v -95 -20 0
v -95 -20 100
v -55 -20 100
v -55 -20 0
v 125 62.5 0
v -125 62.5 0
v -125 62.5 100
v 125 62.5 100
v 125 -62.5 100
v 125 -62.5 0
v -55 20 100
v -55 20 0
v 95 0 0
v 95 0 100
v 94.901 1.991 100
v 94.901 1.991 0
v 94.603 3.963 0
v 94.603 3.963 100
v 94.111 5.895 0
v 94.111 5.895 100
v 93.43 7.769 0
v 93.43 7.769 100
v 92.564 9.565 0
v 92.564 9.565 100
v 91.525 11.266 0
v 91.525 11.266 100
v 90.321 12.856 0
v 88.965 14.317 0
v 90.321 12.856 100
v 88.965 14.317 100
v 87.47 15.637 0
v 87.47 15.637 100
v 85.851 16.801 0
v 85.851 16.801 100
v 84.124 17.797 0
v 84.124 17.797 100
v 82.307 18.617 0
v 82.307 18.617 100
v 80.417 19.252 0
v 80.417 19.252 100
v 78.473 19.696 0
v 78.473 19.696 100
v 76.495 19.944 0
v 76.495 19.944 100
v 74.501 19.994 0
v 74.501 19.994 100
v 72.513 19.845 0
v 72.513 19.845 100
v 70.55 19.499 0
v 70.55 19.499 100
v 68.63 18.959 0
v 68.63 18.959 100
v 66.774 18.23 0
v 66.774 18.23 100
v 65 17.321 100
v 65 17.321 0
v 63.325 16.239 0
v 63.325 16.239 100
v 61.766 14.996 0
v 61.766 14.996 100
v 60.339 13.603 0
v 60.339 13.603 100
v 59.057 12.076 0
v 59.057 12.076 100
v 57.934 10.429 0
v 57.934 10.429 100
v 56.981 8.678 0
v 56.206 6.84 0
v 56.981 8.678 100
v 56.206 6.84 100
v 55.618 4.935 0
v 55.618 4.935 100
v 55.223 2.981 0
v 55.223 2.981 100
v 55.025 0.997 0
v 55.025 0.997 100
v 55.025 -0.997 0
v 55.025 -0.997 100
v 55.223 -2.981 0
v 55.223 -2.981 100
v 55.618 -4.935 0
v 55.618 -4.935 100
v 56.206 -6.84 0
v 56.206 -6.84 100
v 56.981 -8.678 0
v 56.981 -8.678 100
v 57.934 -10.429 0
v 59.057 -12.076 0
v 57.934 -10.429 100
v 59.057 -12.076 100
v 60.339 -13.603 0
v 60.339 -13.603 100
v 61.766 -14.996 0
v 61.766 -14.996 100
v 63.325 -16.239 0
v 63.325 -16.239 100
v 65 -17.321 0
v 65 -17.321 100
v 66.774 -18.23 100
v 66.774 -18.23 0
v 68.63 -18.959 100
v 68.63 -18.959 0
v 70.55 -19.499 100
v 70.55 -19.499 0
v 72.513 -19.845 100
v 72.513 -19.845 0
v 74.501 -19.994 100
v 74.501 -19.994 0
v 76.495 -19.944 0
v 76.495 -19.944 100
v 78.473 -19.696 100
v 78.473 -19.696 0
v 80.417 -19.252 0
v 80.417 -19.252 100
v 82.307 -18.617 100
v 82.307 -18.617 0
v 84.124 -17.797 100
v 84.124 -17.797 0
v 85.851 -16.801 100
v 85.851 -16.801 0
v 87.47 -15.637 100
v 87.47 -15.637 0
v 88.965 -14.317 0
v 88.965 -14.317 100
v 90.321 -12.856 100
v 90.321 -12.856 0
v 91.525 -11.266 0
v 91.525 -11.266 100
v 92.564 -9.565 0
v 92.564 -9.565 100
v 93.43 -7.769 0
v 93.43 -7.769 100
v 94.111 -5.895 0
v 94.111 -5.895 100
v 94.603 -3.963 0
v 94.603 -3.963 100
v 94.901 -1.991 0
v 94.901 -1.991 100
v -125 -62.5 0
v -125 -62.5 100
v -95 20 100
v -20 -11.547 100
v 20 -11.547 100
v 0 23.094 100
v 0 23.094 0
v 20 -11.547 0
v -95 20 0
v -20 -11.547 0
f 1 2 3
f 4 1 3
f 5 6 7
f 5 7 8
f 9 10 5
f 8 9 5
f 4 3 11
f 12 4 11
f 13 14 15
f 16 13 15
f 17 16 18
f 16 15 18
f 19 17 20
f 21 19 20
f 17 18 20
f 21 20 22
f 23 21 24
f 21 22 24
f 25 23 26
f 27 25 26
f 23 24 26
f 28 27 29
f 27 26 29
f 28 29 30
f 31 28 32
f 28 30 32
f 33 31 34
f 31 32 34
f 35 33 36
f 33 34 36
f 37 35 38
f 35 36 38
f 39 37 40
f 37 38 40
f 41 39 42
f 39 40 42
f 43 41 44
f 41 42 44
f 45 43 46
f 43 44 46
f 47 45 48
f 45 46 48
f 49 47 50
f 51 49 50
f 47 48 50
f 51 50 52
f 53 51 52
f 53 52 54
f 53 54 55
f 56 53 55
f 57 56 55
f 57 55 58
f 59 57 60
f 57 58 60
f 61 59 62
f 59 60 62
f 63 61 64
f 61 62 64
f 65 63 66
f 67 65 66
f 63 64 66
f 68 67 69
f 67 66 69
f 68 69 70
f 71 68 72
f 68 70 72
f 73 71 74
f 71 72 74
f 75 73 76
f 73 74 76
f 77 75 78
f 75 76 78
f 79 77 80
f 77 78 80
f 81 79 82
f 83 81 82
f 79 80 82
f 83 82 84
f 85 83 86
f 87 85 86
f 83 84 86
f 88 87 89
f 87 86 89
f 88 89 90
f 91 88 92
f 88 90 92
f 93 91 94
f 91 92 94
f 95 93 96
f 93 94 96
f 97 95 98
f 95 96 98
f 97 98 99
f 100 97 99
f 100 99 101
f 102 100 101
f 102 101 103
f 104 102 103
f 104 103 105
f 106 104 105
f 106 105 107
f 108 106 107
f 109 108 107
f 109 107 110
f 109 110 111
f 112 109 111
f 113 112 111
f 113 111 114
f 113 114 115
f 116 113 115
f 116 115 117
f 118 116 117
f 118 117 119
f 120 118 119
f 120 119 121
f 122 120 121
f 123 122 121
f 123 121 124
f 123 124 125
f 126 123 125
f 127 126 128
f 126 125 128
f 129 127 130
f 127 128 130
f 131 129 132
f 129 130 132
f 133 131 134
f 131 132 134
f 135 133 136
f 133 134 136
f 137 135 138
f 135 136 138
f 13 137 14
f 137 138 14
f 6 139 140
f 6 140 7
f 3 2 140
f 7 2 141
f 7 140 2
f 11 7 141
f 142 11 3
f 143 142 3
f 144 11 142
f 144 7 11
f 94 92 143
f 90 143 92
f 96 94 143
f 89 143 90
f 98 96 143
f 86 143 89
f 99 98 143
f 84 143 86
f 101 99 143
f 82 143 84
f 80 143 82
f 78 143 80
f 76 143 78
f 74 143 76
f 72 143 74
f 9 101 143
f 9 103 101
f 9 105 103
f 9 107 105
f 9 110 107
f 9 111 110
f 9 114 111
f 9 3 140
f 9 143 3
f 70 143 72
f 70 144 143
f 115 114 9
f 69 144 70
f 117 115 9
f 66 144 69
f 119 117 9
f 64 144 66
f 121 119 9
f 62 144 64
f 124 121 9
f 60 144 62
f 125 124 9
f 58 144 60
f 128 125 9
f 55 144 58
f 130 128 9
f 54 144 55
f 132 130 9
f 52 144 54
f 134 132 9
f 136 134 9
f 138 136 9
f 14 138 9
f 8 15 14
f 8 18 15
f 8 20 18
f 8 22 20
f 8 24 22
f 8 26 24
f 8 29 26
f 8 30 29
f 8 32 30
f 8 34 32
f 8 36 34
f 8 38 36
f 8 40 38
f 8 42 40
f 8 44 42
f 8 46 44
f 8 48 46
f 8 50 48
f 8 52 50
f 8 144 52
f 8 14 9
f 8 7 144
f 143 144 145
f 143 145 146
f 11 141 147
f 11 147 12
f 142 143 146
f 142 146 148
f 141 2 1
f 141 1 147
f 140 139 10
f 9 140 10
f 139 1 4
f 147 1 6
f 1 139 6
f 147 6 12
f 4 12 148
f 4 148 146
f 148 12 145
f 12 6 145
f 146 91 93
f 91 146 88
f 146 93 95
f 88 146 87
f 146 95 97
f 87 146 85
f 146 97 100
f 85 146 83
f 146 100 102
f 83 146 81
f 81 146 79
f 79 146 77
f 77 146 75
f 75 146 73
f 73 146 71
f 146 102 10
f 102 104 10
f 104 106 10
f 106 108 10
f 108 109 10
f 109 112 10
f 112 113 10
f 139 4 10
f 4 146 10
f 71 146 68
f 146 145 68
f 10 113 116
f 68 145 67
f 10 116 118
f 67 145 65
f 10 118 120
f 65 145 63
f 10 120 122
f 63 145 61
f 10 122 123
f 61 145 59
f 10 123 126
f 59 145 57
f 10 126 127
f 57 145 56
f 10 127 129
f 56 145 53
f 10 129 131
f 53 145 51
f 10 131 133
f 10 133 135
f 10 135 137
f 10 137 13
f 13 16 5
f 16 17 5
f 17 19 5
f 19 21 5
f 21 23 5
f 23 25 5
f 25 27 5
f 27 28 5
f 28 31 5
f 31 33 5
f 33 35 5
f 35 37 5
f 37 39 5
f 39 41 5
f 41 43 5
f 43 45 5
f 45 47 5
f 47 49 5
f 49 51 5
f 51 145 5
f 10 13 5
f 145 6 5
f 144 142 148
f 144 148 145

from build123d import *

# Parameters (mm, degrees)
SKETCH1_W           = 250
SKETCH1_H           = 125
SKETCH1_W_2         = 230
SKETCH1_H_2         = 115
BOSS_EXTRUDE1_DEPTH = 100
SKETCH3_W           = 250
SKETCH3_H           = 125
SKETCH3_W_2         = 230
SKETCH3_H_2         = 115
SKETCH3_R           = 20
SKETCH3_W_3         = 40
SKETCH3_H_3         = 40
BOSS_EXTRUDE4_DEPTH = 100


with BuildPart() as part:
    # Sketch1 → Boss-Extrude1 (new body)
    with BuildSketch(Plane.XY):
        Rectangle(SKETCH1_W, SKETCH1_H)
        Rectangle(SKETCH1_W_2, SKETCH1_H_2, mode=Mode.SUBTRACT)
    extrude(amount=BOSS_EXTRUDE1_DEPTH)

    # Sketch3 → Boss-Extrude4 (add)
    # profile 1 of 2: a face of its own
    with BuildSketch(Plane.XY.offset(100)):
        Rectangle(SKETCH3_W, SKETCH3_H)
        Rectangle(SKETCH3_W_2, SKETCH3_H_2, mode=Mode.SUBTRACT)
    # profile 2 of 2: a face of its own
    with BuildSketch(Plane.XY.offset(100)):
        Rectangle(SKETCH3_W_2, SKETCH3_H_2)
        with Locations((75, 0)):
            Circle(SKETCH3_R, mode=Mode.SUBTRACT)
        with Locations((-75, 0)):
            Rectangle(SKETCH3_W_3, SKETCH3_H_3, mode=Mode.SUBTRACT)
        Polygon((0, 23.094010768), (20, -11.547005384), (-20, -11.547005384), align=None, mode=Mode.SUBTRACT)
    extrude(amount=-BOSS_EXTRUDE4_DEPTH)


solid = part.part
